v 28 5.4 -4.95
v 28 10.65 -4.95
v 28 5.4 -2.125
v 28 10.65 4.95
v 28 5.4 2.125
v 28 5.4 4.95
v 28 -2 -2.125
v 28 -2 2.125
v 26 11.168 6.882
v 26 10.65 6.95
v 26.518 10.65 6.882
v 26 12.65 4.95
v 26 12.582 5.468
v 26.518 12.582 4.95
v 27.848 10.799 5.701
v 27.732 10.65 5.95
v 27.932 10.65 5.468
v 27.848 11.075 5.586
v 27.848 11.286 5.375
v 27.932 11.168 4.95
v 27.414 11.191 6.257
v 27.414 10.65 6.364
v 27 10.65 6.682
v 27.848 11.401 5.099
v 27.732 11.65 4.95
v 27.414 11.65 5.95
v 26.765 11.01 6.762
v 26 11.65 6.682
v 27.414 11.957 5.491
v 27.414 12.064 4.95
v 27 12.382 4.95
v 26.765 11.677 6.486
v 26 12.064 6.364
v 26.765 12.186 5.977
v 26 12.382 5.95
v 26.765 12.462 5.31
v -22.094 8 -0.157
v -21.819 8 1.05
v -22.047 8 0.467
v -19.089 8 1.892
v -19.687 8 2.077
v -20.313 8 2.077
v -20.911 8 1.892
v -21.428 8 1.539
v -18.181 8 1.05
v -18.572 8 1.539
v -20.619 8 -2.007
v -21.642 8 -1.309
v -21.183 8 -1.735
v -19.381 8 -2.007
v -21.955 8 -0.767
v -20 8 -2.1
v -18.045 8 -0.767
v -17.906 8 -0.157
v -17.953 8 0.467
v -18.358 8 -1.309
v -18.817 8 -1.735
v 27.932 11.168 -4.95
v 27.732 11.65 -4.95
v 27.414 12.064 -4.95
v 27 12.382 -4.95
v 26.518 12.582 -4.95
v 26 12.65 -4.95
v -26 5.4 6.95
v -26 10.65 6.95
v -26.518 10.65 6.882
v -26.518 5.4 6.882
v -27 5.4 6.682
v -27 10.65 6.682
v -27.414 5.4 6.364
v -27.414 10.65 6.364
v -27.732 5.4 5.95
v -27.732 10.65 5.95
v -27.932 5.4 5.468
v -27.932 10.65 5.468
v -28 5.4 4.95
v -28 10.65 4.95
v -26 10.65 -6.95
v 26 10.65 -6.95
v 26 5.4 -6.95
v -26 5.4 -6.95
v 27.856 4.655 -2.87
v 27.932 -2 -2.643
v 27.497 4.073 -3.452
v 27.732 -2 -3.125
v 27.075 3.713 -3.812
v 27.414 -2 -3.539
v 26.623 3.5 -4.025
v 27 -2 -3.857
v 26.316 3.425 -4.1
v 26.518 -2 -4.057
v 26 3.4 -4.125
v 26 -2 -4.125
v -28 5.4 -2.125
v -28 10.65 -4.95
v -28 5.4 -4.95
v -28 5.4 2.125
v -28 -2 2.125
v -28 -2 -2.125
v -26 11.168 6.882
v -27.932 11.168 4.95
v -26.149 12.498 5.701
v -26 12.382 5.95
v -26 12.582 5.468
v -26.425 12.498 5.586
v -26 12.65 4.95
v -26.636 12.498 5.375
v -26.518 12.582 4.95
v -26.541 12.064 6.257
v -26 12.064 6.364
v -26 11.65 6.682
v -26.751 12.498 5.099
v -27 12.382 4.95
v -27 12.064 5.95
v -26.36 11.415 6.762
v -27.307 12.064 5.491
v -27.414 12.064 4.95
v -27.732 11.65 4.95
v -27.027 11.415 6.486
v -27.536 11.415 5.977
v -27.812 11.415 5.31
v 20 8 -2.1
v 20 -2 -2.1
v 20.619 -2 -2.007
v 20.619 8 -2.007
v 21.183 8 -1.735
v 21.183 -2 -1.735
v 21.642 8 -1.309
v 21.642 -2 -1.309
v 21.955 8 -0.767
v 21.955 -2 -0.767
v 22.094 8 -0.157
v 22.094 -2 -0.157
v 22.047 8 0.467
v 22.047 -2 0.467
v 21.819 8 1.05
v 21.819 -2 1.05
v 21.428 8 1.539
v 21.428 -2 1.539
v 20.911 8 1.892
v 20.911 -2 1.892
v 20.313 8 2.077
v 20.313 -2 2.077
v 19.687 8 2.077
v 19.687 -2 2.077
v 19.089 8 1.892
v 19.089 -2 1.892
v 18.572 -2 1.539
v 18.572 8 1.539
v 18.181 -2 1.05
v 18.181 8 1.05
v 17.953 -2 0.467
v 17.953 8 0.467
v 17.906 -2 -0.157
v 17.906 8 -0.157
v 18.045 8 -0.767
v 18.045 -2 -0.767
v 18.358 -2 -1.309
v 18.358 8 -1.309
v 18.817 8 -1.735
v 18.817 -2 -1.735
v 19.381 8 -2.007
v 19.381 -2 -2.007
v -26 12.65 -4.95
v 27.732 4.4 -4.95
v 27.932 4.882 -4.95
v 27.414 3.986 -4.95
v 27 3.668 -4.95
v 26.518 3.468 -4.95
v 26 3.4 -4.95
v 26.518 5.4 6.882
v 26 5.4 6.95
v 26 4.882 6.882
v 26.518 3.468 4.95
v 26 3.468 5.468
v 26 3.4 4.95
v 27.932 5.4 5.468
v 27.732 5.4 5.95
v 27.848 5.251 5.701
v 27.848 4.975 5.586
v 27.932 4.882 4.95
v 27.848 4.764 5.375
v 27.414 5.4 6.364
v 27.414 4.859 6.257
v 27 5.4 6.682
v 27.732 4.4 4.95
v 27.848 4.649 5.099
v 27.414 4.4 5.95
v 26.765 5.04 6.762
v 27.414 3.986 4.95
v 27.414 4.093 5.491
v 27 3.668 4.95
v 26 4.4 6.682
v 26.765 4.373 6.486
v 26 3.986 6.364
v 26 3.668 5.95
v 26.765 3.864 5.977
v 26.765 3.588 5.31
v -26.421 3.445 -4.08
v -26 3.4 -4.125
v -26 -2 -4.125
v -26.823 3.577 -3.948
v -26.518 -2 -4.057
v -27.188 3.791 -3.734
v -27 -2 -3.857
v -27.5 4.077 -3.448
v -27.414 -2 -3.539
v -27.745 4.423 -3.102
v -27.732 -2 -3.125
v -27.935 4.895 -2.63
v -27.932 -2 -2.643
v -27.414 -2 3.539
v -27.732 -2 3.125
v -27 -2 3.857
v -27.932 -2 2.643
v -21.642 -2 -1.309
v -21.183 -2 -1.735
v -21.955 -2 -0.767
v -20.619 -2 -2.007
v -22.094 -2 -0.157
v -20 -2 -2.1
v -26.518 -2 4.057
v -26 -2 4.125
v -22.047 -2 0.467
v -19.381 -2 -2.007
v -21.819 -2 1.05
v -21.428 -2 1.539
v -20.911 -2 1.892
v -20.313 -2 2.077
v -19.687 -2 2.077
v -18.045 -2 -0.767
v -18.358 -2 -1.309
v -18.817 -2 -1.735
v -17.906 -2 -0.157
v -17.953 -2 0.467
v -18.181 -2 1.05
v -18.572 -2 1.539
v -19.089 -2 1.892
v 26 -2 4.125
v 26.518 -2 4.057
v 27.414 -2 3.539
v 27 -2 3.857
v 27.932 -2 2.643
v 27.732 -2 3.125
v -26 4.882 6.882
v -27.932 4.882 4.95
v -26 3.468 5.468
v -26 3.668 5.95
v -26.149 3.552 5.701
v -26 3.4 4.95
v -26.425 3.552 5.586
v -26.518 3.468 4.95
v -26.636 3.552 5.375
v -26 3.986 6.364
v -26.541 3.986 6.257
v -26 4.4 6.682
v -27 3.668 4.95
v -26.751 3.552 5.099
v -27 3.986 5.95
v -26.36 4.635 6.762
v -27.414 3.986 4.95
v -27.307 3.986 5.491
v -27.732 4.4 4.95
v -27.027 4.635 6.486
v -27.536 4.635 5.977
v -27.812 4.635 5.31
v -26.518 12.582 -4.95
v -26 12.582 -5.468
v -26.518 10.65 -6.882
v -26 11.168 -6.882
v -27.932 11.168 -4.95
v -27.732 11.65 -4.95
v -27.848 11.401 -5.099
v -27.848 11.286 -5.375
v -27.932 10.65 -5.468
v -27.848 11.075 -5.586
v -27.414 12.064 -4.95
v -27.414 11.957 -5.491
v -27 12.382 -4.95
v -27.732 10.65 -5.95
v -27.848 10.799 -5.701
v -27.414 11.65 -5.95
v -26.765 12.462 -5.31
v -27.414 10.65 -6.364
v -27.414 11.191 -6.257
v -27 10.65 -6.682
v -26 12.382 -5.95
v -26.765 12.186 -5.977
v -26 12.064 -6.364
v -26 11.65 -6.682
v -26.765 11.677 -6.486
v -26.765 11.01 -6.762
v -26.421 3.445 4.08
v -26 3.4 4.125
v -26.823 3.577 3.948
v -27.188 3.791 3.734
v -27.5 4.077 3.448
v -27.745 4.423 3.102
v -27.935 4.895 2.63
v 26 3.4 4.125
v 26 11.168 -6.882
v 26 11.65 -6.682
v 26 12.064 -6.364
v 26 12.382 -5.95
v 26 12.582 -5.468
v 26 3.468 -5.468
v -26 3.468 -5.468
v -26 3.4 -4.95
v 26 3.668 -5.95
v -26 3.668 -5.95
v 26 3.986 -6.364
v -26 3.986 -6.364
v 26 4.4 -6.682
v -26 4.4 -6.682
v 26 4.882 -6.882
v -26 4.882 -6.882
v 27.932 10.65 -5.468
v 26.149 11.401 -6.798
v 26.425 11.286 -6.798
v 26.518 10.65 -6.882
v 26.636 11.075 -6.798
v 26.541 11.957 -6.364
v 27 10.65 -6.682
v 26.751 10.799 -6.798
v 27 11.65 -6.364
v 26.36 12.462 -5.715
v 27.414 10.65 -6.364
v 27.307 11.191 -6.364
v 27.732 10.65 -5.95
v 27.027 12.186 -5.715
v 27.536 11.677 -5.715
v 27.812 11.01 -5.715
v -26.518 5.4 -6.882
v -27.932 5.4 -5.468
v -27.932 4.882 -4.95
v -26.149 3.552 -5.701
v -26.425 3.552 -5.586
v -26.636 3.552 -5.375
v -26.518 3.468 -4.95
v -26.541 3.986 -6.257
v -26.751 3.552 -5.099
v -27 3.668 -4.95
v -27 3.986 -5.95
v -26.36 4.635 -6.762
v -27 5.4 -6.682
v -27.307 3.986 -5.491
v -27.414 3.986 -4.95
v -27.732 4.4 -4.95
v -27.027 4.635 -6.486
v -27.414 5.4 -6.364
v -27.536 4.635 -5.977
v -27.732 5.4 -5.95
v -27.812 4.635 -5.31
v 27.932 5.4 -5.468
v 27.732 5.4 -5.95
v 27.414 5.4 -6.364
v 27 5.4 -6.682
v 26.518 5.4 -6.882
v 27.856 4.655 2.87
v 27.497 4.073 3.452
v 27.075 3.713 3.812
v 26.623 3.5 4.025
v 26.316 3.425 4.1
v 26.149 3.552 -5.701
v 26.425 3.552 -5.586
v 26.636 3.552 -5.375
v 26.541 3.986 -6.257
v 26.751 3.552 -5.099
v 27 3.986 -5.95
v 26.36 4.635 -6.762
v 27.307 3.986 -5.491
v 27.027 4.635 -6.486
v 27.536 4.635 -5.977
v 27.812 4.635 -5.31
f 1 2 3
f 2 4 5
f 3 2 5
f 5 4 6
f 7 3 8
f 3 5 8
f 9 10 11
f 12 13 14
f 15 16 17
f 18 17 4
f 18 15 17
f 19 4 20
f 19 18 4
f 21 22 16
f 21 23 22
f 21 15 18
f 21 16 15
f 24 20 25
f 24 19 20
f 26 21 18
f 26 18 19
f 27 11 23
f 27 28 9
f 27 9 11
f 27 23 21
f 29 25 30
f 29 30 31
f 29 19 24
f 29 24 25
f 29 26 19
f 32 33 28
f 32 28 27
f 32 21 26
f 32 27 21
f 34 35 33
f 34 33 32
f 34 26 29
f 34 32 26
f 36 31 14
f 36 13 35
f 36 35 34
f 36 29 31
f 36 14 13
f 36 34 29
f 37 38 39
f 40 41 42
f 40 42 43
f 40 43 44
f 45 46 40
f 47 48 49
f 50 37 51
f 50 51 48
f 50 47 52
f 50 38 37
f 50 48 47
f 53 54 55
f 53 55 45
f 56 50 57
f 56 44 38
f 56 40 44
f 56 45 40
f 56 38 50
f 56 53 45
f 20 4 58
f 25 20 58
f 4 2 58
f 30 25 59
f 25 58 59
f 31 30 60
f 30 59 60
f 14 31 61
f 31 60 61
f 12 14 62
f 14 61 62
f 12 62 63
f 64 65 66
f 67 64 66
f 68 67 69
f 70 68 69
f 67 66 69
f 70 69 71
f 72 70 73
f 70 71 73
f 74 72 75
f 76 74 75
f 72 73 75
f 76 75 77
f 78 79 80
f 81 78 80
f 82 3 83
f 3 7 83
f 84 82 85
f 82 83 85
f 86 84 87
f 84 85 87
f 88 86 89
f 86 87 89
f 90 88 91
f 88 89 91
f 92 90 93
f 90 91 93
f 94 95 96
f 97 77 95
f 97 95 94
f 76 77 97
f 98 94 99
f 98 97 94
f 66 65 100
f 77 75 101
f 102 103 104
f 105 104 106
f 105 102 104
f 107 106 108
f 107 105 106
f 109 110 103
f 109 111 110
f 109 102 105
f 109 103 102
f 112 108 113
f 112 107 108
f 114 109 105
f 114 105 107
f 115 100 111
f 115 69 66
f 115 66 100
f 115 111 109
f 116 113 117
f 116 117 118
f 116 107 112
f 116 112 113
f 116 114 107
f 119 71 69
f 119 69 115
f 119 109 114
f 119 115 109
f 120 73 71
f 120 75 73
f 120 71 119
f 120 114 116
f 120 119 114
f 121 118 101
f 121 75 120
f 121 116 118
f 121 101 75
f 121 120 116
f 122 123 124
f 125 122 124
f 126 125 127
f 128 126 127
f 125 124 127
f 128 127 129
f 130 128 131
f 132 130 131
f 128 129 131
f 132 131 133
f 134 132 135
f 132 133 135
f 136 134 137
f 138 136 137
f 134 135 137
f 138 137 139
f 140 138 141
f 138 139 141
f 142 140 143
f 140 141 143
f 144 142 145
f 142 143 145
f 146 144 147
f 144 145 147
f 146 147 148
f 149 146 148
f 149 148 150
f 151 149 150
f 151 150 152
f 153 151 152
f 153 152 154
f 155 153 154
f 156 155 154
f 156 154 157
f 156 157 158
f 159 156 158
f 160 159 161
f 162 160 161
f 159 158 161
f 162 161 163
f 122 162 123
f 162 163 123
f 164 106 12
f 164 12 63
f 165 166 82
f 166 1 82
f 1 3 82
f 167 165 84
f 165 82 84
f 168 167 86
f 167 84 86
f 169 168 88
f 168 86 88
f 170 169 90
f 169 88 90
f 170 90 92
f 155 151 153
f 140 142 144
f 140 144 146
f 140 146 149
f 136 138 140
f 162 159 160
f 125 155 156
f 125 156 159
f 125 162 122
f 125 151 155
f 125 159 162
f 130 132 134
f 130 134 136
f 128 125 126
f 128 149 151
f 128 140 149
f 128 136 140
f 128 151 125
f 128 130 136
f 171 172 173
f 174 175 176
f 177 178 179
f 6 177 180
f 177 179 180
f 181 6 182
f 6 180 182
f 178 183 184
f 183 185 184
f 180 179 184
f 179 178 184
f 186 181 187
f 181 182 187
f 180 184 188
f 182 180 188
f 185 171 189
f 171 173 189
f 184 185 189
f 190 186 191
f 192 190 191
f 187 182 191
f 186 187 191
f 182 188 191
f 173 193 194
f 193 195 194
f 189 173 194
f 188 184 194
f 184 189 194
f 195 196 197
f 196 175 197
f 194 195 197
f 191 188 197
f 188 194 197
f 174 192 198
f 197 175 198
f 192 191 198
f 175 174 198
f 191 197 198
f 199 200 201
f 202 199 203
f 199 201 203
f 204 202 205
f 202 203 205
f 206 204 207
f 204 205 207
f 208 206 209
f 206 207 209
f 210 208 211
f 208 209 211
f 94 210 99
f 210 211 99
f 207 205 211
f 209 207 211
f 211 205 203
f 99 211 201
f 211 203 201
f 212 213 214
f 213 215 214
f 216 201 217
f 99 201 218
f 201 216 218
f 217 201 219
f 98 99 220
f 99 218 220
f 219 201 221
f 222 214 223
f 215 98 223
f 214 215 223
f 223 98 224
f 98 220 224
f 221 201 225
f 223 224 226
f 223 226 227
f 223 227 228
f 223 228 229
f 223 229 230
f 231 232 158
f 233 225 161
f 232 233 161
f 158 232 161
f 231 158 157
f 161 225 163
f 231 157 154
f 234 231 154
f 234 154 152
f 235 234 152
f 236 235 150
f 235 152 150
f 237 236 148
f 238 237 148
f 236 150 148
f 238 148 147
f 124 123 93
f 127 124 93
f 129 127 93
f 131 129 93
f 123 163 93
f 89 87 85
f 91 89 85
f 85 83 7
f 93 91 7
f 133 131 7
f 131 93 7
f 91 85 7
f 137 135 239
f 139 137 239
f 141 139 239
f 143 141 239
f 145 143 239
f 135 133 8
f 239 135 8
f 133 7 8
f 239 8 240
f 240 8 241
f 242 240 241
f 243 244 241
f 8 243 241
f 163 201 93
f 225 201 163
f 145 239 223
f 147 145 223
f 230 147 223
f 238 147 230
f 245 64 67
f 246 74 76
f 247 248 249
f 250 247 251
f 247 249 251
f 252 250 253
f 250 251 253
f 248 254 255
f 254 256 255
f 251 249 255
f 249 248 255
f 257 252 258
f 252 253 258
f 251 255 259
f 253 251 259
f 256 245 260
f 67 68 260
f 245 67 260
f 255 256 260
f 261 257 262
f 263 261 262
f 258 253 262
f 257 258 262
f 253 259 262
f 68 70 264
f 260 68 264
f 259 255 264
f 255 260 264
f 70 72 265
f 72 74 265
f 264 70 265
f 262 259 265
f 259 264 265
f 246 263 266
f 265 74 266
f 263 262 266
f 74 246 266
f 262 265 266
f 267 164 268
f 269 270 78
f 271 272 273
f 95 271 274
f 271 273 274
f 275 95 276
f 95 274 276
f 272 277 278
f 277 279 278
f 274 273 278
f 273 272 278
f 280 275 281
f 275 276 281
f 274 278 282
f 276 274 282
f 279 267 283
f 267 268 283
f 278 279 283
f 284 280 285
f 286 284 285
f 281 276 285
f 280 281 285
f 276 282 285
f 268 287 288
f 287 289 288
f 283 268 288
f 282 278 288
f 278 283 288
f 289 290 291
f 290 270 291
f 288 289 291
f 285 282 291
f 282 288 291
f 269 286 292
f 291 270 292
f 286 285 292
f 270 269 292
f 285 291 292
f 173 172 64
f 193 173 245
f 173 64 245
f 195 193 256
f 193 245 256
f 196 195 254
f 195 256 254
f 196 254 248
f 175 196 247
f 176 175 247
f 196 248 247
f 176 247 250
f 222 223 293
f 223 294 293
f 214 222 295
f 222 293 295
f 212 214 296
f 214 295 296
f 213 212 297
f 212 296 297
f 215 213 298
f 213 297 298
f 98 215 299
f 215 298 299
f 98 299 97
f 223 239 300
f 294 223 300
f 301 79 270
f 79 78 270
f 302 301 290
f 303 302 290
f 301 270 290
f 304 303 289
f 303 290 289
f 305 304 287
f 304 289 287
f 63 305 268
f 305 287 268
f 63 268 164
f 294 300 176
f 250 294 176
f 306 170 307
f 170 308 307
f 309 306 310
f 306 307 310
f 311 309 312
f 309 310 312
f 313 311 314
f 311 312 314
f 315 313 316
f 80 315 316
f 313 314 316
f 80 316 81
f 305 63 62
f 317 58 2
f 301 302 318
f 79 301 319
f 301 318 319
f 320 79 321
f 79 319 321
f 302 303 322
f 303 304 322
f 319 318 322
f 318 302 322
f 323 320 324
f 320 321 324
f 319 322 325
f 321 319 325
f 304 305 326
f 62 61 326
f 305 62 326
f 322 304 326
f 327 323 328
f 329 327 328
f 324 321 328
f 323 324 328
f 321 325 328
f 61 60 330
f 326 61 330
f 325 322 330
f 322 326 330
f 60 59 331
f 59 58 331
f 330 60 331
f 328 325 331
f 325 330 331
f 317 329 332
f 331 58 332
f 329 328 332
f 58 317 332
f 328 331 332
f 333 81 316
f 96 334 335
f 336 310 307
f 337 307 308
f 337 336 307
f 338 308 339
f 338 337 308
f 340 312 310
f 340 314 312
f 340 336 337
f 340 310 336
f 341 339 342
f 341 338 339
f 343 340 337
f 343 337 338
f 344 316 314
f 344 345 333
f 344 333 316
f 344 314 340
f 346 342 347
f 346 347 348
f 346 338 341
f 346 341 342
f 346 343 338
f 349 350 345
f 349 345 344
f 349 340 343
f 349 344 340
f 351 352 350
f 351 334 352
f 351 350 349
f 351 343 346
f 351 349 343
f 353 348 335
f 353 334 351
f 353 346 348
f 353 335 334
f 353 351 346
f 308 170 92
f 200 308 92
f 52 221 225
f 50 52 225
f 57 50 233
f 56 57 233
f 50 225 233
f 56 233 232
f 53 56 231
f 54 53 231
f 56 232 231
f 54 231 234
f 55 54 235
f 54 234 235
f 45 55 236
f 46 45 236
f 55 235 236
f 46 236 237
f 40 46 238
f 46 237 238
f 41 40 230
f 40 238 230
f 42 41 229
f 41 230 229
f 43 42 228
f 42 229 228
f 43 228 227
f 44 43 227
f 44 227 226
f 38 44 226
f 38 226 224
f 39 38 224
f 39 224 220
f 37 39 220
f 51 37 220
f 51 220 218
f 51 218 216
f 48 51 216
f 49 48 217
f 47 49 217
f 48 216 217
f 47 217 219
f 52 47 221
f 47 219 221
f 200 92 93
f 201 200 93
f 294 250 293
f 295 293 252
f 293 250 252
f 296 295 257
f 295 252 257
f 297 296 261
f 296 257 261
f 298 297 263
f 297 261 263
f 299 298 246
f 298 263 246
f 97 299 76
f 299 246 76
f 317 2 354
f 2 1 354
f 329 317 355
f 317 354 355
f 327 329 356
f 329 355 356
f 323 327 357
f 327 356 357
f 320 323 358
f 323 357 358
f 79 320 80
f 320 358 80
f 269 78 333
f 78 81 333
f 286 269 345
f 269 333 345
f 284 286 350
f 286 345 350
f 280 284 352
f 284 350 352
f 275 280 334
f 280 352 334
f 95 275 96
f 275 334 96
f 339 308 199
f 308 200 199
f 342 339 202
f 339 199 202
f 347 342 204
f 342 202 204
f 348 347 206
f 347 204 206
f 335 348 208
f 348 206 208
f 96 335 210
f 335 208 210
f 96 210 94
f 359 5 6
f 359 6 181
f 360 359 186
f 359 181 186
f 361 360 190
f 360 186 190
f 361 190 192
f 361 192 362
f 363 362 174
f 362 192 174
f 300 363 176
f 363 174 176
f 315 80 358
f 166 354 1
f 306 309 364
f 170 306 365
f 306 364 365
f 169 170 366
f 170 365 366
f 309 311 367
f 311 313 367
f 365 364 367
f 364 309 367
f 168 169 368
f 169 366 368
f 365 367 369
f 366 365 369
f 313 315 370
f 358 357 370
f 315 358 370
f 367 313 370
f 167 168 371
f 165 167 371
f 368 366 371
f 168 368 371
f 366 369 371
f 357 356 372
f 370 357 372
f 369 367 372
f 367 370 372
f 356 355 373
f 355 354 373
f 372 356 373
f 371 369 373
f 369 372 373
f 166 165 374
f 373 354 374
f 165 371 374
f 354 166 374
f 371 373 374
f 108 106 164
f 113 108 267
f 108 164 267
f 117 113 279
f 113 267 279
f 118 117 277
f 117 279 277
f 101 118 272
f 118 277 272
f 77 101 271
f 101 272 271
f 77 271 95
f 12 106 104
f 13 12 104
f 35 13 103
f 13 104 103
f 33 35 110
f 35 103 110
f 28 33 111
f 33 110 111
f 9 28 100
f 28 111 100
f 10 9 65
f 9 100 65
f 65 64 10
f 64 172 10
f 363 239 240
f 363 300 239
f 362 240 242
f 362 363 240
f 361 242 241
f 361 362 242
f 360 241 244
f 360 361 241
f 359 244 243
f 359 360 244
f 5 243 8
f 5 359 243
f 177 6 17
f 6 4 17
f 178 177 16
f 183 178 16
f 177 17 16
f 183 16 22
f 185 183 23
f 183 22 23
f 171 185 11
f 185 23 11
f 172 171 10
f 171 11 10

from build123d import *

# Parameters (mm, degrees)
PAD_DEPTH       = 28
FILLET_R        = 2
SKETCH003_R     = 2.1
POCKET001_DEPTH = 10


with BuildPart() as part:
    # Sketch → Pad (new body, symmetric)
    with BuildSketch(Plane.YZ):
        Polygon((-2, 4.125), (3.4, 4.125), (3.4, 6.95), (12.65, 6.95), (12.65, -6.95), (3.4, -6.95), (3.4, -4.125), (-2, -4.125), align=None)
    extrude(amount=PAD_DEPTH, both=True)

    # Fillet
    fillet_edges = [part.edges().sort_by_distance(p)[0] for p in [
        (-28, 8.025, 6.95),
        (0, 3.4, 6.95),
        (0, 12.65, 6.95),
        (28, 8.025, 6.95),
        (28, 12.65, 0),
        (0, 12.65, -6.95),
        (-28, 12.65, 0),
        (-28, 8.025, -6.95),
        (28, 8.025, -6.95),
        (0, 3.4, -6.95),
        (28, 3.4, -5.5375),
        (28, 3.4, 5.5375),
        (-28, 3.4, -5.5375),
        (-28, 0.7, -4.125),
        (28, 0.7, -4.125),
        (28, 0.7, 4.125),
        (-28, 0.7, 4.125),
        (-28, 3.4, 5.5375),
    ]]
    fillet(fillet_edges, radius=FILLET_R)

    # Sketch003 (on Face2 of Fillet) → Pocket001 (cut)
    with BuildSketch(Plane(origin=(0, -2, 0), x_dir=(0, 0, -1), z_dir=(0, -1, 0))):
        with Locations((0, 20)):
            Circle(SKETCH003_R)
        with Locations((0, -20)):
            Circle(SKETCH003_R)
    extrude(amount=-POCKET001_DEPTH, mode=Mode.SUBTRACT)


solid = part.part
